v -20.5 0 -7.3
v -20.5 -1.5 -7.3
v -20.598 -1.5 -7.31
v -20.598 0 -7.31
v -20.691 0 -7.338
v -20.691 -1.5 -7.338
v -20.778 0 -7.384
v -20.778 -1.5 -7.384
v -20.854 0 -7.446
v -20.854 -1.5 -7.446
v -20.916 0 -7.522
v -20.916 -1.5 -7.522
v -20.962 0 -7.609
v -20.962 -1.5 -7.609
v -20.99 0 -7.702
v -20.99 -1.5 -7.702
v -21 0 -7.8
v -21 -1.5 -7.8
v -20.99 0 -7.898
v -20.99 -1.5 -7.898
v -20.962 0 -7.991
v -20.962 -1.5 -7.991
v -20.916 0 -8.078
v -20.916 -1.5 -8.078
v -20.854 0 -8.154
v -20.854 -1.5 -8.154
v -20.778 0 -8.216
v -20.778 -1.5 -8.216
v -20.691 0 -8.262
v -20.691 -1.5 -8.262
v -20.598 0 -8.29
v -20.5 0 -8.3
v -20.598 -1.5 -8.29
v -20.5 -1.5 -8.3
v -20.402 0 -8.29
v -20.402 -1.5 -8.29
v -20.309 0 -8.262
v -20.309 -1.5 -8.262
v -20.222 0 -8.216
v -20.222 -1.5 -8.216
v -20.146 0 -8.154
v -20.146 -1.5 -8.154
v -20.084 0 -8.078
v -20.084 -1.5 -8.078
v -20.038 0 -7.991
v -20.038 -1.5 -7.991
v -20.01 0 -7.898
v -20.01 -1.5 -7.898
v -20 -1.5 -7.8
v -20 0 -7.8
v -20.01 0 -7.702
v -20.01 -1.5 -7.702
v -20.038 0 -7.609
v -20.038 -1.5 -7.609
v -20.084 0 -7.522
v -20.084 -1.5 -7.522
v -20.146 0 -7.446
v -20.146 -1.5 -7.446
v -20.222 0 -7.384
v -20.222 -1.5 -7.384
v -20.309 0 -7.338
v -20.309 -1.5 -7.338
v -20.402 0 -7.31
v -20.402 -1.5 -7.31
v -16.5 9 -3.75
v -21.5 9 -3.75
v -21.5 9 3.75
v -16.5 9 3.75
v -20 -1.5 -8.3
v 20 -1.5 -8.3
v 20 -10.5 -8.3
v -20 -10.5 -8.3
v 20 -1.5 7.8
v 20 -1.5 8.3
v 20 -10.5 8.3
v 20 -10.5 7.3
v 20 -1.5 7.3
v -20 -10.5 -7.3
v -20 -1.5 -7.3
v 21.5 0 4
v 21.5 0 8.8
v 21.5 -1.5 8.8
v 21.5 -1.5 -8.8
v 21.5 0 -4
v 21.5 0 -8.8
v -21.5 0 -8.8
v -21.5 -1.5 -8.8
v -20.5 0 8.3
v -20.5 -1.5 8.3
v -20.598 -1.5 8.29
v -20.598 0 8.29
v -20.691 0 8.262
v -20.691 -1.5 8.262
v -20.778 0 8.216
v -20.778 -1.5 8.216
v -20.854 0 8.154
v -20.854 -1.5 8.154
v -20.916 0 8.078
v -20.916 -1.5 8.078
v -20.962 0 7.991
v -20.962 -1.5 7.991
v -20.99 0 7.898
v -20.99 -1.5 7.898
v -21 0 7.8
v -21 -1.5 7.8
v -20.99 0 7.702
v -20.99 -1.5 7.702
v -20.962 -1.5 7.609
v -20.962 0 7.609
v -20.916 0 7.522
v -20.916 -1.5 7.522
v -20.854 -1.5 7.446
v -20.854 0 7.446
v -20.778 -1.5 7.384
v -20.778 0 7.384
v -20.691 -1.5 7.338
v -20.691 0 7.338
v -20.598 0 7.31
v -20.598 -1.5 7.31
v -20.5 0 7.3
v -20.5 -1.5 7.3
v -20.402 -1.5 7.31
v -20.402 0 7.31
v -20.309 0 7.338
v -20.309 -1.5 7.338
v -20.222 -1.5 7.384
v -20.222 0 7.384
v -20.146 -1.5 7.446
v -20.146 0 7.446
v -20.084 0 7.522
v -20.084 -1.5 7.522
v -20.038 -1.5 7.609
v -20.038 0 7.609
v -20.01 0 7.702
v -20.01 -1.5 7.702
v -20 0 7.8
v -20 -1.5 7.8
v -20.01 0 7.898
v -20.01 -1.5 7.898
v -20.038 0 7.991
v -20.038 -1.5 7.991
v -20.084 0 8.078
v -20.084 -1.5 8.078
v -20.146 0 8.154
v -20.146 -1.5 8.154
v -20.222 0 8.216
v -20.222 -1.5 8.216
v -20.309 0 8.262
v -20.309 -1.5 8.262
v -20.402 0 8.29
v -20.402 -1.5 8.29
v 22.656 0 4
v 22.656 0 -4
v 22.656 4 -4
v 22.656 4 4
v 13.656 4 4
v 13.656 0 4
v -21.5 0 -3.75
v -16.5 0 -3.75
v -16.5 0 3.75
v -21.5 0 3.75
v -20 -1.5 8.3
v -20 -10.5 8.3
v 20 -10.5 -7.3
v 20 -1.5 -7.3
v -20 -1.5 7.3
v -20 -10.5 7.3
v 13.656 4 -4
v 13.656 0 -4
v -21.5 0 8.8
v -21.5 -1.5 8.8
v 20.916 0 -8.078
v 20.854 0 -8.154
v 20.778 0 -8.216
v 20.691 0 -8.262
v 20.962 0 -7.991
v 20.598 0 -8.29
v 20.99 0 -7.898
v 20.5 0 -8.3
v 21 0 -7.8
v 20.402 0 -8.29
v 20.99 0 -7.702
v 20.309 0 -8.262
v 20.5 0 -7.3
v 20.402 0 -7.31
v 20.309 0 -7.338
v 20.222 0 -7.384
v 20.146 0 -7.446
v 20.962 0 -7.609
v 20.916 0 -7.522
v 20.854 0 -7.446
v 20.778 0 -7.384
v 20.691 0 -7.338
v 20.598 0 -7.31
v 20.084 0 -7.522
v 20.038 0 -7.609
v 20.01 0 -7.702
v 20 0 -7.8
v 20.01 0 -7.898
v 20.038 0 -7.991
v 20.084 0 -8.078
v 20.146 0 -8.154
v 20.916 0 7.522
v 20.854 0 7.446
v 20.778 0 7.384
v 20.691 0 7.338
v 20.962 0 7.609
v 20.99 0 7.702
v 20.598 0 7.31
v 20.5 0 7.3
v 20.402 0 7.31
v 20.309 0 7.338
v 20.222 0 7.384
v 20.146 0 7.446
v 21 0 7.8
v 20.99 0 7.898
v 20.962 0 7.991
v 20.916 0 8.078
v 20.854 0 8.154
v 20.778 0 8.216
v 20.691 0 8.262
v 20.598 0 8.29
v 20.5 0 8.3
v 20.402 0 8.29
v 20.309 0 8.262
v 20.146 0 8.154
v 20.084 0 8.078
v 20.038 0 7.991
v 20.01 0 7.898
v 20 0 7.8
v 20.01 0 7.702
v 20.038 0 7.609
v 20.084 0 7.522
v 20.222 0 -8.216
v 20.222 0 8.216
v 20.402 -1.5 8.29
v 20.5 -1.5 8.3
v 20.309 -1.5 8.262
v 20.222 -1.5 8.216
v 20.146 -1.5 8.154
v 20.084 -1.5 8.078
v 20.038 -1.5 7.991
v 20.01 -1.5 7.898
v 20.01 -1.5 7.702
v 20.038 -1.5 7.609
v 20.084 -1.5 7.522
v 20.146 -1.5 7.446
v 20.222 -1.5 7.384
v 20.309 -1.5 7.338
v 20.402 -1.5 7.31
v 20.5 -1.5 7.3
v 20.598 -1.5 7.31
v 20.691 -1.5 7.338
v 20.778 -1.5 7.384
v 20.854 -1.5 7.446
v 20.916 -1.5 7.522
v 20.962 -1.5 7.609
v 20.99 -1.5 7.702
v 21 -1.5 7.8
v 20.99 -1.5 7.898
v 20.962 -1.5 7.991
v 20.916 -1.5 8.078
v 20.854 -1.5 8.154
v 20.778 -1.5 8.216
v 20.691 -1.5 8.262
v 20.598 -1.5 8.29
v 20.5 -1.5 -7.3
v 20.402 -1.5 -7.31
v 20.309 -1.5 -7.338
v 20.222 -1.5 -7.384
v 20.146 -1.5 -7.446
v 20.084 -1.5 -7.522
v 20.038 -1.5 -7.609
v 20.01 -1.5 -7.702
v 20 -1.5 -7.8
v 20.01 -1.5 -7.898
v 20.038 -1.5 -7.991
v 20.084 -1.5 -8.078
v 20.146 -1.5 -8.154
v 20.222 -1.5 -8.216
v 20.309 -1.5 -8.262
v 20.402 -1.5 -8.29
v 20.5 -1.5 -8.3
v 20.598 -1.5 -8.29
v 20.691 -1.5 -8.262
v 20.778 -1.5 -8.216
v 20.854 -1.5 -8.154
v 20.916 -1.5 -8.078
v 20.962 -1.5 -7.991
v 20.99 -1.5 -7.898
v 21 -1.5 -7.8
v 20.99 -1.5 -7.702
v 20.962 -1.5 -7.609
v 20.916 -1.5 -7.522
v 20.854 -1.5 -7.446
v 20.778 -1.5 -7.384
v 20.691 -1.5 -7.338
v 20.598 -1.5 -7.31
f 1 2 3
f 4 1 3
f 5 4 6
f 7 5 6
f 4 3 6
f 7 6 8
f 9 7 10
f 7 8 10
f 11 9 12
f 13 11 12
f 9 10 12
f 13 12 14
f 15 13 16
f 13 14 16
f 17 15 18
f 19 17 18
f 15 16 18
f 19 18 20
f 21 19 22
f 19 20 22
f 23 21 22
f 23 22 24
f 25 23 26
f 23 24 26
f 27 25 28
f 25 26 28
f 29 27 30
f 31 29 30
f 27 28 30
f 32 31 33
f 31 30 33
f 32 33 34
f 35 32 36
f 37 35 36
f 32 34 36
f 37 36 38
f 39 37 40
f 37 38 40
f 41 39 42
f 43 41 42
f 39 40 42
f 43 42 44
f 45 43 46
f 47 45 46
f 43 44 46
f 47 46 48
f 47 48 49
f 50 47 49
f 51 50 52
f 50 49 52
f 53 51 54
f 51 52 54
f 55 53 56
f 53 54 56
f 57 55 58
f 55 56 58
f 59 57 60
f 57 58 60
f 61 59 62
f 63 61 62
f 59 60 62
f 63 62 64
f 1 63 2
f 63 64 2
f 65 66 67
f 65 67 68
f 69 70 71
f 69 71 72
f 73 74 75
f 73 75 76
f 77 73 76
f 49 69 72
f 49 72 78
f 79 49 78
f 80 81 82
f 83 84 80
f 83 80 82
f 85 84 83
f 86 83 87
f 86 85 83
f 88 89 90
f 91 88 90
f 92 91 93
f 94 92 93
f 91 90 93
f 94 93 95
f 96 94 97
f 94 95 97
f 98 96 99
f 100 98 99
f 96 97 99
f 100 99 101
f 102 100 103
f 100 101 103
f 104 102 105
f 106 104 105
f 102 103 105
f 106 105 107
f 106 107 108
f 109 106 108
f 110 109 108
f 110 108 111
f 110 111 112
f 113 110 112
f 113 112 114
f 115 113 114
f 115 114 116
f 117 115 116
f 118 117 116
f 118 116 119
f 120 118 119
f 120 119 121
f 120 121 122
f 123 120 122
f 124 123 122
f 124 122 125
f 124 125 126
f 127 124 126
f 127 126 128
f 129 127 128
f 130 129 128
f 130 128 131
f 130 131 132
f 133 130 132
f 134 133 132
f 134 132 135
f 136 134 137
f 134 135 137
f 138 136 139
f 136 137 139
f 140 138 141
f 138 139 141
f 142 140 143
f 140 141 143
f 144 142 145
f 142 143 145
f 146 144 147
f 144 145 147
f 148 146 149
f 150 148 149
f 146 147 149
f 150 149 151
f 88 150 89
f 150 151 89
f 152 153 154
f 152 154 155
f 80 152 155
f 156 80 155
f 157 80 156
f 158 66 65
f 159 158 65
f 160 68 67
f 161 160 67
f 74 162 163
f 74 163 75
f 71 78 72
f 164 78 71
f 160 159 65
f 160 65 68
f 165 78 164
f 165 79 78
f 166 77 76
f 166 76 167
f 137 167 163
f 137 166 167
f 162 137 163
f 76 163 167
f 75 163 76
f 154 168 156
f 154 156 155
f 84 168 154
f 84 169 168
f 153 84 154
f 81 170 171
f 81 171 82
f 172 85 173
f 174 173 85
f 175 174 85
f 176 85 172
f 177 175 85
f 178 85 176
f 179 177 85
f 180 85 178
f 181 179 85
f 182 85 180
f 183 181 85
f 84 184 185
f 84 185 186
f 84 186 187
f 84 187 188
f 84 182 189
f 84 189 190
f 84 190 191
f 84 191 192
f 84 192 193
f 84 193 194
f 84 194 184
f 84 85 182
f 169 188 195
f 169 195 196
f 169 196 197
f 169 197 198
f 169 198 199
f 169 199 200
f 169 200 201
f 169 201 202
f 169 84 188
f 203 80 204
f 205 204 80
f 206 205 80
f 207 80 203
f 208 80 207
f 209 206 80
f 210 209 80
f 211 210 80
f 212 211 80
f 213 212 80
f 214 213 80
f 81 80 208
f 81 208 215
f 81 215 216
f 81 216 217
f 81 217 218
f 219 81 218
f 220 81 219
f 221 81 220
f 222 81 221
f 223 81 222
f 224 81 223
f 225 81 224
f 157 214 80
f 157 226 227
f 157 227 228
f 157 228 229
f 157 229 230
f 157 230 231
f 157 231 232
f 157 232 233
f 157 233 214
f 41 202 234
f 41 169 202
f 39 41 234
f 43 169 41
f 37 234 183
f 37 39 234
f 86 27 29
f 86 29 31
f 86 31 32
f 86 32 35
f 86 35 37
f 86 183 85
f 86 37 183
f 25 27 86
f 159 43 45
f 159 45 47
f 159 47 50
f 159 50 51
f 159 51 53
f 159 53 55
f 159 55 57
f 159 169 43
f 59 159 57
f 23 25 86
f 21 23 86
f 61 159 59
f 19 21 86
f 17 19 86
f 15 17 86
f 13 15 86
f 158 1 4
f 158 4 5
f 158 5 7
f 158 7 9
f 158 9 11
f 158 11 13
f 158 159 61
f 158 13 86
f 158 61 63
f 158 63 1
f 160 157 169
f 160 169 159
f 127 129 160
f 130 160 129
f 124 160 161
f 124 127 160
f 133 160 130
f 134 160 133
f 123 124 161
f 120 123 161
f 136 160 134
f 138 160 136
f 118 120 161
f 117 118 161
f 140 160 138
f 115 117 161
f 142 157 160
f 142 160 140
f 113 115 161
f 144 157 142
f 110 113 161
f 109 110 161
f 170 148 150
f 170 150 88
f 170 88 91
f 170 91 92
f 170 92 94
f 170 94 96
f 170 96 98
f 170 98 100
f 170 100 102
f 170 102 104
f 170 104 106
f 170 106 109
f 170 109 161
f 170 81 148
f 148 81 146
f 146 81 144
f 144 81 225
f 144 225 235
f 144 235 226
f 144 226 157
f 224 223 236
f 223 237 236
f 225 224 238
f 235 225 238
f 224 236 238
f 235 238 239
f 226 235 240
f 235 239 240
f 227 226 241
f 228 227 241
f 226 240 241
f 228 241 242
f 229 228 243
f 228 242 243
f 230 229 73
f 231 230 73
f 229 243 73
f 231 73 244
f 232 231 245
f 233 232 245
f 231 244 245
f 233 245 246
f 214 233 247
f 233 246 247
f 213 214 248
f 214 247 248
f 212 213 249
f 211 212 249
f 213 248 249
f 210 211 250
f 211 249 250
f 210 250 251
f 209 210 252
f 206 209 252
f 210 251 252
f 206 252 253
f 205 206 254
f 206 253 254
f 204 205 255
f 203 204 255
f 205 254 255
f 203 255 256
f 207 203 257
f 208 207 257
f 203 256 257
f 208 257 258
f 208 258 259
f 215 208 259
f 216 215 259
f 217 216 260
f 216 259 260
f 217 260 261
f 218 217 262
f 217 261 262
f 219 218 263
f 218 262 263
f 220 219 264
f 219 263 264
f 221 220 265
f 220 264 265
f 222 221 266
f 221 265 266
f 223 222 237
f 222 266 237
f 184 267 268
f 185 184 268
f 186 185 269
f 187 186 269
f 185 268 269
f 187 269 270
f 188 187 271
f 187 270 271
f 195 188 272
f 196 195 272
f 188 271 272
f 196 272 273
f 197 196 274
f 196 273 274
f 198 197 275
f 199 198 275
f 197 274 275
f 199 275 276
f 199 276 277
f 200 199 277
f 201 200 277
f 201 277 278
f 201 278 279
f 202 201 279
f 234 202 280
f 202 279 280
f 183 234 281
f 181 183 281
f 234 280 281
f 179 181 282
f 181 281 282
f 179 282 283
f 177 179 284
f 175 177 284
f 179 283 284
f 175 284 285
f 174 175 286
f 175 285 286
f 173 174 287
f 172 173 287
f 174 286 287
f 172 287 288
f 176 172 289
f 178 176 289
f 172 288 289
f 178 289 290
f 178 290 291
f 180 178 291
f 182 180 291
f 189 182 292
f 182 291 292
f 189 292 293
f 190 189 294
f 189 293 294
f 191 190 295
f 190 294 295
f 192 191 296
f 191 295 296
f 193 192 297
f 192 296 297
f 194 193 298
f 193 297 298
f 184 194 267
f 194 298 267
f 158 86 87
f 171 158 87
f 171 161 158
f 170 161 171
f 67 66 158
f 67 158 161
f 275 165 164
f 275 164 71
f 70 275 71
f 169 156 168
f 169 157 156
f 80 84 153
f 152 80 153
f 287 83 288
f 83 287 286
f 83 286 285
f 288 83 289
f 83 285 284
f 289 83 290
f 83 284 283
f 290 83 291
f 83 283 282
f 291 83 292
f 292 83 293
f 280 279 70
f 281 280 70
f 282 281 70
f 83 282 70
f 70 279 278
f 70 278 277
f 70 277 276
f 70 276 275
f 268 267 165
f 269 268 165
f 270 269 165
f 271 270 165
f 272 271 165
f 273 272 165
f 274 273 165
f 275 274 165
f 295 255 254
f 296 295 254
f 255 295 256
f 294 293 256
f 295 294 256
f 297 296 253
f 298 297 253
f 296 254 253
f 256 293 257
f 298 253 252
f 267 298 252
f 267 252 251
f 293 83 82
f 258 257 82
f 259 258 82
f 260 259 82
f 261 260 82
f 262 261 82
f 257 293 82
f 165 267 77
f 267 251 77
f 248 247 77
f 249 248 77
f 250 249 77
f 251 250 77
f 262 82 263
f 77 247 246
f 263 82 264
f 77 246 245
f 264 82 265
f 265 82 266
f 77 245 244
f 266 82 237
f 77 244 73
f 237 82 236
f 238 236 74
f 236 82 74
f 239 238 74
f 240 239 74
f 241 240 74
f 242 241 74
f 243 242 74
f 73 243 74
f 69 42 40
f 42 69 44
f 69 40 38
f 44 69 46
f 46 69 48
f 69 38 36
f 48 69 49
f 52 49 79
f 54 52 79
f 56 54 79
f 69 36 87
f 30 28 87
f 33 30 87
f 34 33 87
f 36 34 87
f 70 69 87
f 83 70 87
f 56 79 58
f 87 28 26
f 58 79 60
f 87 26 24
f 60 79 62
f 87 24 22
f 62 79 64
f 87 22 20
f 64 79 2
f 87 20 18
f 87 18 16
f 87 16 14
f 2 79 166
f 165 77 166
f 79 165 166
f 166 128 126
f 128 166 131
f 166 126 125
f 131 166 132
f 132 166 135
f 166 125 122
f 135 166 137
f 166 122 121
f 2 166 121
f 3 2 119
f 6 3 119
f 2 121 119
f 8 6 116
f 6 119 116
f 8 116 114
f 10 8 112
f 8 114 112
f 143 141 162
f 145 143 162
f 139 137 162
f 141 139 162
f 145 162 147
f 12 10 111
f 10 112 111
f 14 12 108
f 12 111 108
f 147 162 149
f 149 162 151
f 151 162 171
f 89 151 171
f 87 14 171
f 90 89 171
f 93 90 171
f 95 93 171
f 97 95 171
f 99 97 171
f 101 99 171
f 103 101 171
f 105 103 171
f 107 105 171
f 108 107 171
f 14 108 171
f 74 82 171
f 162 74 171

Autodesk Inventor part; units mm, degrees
ref_plane "YZ Plane" through (0, 0, 0) normal (1, 0, 0) x (0, 1, 0)
ref_plane "XZ Plane" through (0, 0, 0) normal (0, 1, 0) x (-1, 0, 0)
ref_plane "XY Plane" through (0, 0, 0) normal (0, 0, 1) x (1, 0, 0)
sketch "Sketch1" plane through (0, 0, 0) normal (0, 1, 0) x (-1, 0, 0)
  line L0 (21.5, 8.8) -> (-21.5, 8.8)
  line L1 (-21.5, 8.8) -> (-21.5, -8.8)
  line L2 (-21.5, -8.8) -> (21.5, -8.8)
  line L3 (21.5, -8.8) -> (21.5, 8.8)
  line L4 (21.5, 8.8) -> (-21.5, -8.8) construction
  line L5 (-21.5, 8.8) -> (21.5, -8.8) construction
  line L6 (20.5, 7.8) -> (-20.5, 7.8) construction
  line L7 (-20.5, 7.8) -> (-20.5, -7.8) construction
  line L8 (-20.5, -7.8) -> (20.5, -7.8) construction
  line L9 (20.5, -7.8) -> (20.5, 7.8) construction
  point P0 (0, 0)
  dimension "d0" = 43
  dimension "d1" = 17.6
  dimension "d2" = 1
extrude "Extrusion1" add sketch "Sketch1" against normal blind 1.5
hole "Hole1" at (-20.5, 0, 7.8) at (-20.5, 0, -7.8) at (20.5, 0, 7.8) at (20.5, 0, -7.8) direction (0, -1, 0) diameter 1 end through all
sketch "Sketch2" plane through (0, 0, 0) normal (0, 1, 0) x (1, 0, 0)
  line L0 (-21.5, 3.75) -> (-16.5, 3.75)
  line L1 (-16.5, 3.75) -> (-16.5, -3.75)
  line L2 (-16.5, -3.75) -> (-21.5, -3.75)
  line L3 (-21.5, -3.75) -> (-21.5, 3.75)
  line L4 (-21.5, 3.75) -> (-16.5, -3.75) construction
  line L5 (-16.5, 3.75) -> (-21.5, -3.75) construction
  line L6 (-21.5, 8.8) -> (-21.5, -8.8) projected
  point P0 (0, 0)
  point P1 (-19, 0)
  point P2 (-21.5, 0)
  dimension "d12" = 5
  dimension "d13" = 7.5
extrude "Extrusion2" add sketch "Sketch2" along normal blind 9
sketch "Sketch3" plane through (0, 0, 0) normal (0, 1, 0) x (1, 0, 0)
  point P0 (0, 0)
sketch "Sketch4" plane through (0, 0, 0) normal (0, 1, 0) x (1, 0, 0)
  line L0 (13.6557, 4) -> (22.6557, 4)
  line L1 (22.6557, 4) -> (22.6557, -4)
  line L2 (22.6557, -4) -> (13.6557, -4)
  line L3 (13.6557, -4) -> (13.6557, 4)
  line L4 (13.6557, 4) -> (22.6557, -4) construction
  line L5 (22.6557, 4) -> (13.6557, -4) construction
  point P0 (0, 0)
  point P1 (18.1557, 0)
  dimension "d16" = 9
  dimension "d17" = 8
extrude "Extrusion3" add sketch "Sketch4" along normal blind 4
sketch "Sketch5" plane through (0, -1.5, 0) normal (0, -1, 0) x (1, 0, 0)
  circle A0 centre (20.5, 7.8) radius 0.5 construction
  circle A1 centre (-20.5, 7.8) radius 0.5 construction
  circle A2 centre (-20.5, -7.8) radius 0.5 construction
  circle A3 centre (20.5, -7.8) radius 0.5 construction
  line L0 (21.5, -8.8) -> (21.5, 8.8) construction
  line L1 (21.5, 8.8) -> (-21.5, 8.8) construction
  line L2 (-21.5, 8.8) -> (-21.5, -8.8) construction
  line L3 (-21.5, -8.8) -> (21.5, -8.8) construction
  line L4 (-20, 8.3) -> (20, 8.3)
  line L5 (20, 8.3) -> (20, 7.3)
  line L6 (20, 7.3) -> (-20, 7.3)
  line L7 (-20, 7.3) -> (-20, 8.3)
  line L8 (20, -8.3) -> (-20, -8.3)
  line L9 (-20, -8.3) -> (-20, -7.3)
  line L10 (-20, -7.3) -> (20, -7.3)
  line L11 (20, -7.3) -> (20, -8.3)
  point P0 (0, 0)
extrude "Extrusion4" add sketch "Sketch5" along normal blind 9
properties part number "nano_footprint"
